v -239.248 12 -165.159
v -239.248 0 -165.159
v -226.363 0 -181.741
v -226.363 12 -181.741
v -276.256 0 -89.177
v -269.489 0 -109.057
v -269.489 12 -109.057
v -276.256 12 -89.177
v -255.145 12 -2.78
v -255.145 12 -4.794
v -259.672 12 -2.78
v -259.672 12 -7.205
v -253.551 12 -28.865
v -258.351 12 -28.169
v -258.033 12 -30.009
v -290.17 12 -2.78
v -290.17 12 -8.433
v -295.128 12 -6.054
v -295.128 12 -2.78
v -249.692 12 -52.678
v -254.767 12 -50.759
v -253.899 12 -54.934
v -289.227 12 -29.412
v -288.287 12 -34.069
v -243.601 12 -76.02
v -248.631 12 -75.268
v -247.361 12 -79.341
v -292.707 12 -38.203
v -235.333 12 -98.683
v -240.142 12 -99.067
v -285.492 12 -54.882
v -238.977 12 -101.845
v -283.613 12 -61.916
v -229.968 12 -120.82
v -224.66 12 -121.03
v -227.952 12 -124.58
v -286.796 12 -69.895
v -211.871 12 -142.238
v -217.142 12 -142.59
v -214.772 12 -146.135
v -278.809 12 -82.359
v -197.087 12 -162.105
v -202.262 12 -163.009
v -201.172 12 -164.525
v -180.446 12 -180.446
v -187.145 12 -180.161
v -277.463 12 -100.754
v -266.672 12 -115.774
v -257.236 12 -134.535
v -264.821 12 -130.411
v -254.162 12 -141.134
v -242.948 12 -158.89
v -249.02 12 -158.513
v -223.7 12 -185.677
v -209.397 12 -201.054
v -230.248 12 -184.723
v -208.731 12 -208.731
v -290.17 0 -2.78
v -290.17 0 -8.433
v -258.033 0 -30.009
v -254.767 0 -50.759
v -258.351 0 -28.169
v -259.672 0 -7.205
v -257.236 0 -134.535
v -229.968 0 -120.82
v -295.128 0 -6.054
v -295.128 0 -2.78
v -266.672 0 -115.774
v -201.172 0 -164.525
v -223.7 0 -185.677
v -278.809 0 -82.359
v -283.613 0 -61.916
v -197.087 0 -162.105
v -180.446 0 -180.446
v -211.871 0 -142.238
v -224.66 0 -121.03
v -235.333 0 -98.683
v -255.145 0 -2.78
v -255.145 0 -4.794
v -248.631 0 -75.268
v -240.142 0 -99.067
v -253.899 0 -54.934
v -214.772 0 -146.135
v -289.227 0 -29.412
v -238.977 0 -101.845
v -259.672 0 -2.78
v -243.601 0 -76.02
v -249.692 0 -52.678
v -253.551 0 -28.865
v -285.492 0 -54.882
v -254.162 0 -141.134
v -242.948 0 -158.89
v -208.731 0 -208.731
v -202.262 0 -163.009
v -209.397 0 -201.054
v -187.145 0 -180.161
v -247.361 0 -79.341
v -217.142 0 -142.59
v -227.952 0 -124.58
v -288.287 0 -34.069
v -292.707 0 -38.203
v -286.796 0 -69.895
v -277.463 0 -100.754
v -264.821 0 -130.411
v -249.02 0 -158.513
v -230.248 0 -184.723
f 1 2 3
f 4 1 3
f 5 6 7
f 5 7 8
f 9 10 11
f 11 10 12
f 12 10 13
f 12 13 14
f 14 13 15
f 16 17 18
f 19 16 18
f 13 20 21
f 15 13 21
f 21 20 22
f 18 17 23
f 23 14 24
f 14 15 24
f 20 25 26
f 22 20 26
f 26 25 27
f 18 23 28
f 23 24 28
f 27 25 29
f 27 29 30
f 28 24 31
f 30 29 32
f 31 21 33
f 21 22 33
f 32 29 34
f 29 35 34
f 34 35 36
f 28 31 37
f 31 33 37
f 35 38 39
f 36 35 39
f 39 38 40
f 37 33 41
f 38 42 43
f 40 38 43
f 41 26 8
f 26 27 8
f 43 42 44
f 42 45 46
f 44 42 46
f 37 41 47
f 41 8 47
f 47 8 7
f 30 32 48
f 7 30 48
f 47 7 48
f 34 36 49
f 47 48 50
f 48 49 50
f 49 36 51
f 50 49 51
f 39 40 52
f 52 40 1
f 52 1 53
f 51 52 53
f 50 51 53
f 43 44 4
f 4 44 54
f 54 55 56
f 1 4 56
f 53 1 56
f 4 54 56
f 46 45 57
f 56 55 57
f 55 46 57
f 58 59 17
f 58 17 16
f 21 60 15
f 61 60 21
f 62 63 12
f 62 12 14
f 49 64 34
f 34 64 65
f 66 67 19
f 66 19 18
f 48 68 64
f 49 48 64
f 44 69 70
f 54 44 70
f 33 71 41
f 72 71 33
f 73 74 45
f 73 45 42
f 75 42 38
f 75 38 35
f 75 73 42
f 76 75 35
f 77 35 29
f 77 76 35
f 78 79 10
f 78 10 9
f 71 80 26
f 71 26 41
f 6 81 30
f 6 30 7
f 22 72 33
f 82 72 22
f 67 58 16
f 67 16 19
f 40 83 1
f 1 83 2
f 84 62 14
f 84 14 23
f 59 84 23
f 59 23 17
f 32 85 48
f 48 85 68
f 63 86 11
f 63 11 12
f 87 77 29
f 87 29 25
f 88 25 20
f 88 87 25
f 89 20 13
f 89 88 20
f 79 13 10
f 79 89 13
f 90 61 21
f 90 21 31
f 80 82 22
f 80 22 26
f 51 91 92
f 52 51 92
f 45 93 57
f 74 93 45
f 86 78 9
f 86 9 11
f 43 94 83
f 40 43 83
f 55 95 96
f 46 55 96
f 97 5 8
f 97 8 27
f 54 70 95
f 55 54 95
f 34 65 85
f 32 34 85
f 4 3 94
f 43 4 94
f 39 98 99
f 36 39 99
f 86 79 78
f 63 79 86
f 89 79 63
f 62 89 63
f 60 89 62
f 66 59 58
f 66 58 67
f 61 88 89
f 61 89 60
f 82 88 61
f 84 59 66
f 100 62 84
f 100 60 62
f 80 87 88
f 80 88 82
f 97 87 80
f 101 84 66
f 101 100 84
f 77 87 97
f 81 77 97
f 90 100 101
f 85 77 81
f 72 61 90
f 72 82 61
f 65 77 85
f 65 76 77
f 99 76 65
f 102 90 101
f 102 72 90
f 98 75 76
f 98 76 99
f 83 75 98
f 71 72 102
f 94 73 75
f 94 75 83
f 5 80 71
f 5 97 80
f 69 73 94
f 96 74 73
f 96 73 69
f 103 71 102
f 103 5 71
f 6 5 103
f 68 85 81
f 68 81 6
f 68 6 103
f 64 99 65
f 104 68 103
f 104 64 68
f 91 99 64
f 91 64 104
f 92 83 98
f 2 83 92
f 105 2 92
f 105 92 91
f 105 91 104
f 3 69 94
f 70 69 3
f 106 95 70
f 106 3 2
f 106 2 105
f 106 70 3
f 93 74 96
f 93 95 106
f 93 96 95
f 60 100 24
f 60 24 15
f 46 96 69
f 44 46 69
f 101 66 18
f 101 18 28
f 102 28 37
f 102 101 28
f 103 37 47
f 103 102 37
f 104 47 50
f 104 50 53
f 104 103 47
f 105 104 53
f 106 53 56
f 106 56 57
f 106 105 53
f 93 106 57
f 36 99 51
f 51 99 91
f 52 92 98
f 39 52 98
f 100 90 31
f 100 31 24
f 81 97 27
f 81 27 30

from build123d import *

# Parameters (mm, degrees)
BOSS_EXTRUDE1_DEPTH = 12


with BuildPart() as part:
    # Sketch1 → Boss-Extrude1 (new body)
    with BuildSketch(Plane(origin=(0, 0, 0), x_dir=(1, 0, 0), z_dir=(0, 1, 0))):
        with BuildLine():
            Line((-208.730747898, 208.730747898), (-180.446460839, 180.446460839))
            ThreePointArc((-180.446460839, 180.446460839), (-211.871169585, 142.237594702), (-235.332727793, 98.683202756))
            ThreePointArc((-235.332727793, 98.683202756), (-249.691614544, 52.678245772), (-255.14471115, 4.794037172))
            Line((-255.14471115, 4.794037172), (-255.14471115, 2.779626551))
            Line((-255.14471115, 2.779626551), (-259.672052343, 2.779626551))
            Line((-259.672052343, 2.779626551), (-259.672052343, 7.204875095))
            Line((-259.672052343, 7.204875095), (-258.35063673, 28.168690687))
            Line((-258.35063673, 28.168690687), (-289.227344139, 29.411556091))
            Line((-289.227344139, 29.411556091), (-290.170172115, 8.432501391))
            Line((-290.170172115, 8.432501391), (-290.170172115, 2.779626551))
            Line((-290.170172115, 2.779626551), (-295.127762341, 2.779626551))
            Line((-295.127762341, 2.779626551), (-295.127762341, 6.054265565))
            ThreePointArc((-295.127762341, 6.054265565), (-271.547028538, 115.755179272), (-208.730747898, 208.730747898))
        make_face()
        Polygon((-288.286547304, 34.069084362), (-258.033222279, 30.008925637), (-254.767009525, 50.758854735), (-285.491553173, 54.882253531), align=None, mode=Mode.SUBTRACT)
        Polygon((-283.612878523, 61.915838046), (-253.89939669, 54.933619681), (-248.631031599, 75.267631401), (-278.809043274, 82.359007245), align=None, mode=Mode.SUBTRACT)
        Polygon((-276.255921554, 89.176800074), (-247.361344598, 79.340855863), (-240.142390382, 99.066838813), (-269.488694715, 109.056554622), align=None, mode=Mode.SUBTRACT)
        Polygon((-229.967759139, 120.819849226), (-238.977493449, 101.844802692), (-266.671759318, 115.77418308), (-257.235727442, 134.534814797), align=None, mode=Mode.SUBTRACT)
        Polygon((-217.141868251, 142.590375773), (-227.952465343, 124.580414811), (-254.16244031, 141.134484167), (-242.948393328, 158.889628499), align=None, mode=Mode.SUBTRACT)
        Polygon((-202.261755682, 163.008777697), (-214.772333152, 146.135332444), (-239.248466479, 165.159498585), (-226.362501502, 181.741172494), align=None, mode=Mode.SUBTRACT)
        Polygon((-187.145427565, 180.161244264), (-201.171686006, 164.525011421), (-223.699930588, 185.676700973), (-209.397447264, 201.053587246), align=None, mode=Mode.SUBTRACT)
    extrude(amount=BOSS_EXTRUDE1_DEPTH)


solid = part.part
